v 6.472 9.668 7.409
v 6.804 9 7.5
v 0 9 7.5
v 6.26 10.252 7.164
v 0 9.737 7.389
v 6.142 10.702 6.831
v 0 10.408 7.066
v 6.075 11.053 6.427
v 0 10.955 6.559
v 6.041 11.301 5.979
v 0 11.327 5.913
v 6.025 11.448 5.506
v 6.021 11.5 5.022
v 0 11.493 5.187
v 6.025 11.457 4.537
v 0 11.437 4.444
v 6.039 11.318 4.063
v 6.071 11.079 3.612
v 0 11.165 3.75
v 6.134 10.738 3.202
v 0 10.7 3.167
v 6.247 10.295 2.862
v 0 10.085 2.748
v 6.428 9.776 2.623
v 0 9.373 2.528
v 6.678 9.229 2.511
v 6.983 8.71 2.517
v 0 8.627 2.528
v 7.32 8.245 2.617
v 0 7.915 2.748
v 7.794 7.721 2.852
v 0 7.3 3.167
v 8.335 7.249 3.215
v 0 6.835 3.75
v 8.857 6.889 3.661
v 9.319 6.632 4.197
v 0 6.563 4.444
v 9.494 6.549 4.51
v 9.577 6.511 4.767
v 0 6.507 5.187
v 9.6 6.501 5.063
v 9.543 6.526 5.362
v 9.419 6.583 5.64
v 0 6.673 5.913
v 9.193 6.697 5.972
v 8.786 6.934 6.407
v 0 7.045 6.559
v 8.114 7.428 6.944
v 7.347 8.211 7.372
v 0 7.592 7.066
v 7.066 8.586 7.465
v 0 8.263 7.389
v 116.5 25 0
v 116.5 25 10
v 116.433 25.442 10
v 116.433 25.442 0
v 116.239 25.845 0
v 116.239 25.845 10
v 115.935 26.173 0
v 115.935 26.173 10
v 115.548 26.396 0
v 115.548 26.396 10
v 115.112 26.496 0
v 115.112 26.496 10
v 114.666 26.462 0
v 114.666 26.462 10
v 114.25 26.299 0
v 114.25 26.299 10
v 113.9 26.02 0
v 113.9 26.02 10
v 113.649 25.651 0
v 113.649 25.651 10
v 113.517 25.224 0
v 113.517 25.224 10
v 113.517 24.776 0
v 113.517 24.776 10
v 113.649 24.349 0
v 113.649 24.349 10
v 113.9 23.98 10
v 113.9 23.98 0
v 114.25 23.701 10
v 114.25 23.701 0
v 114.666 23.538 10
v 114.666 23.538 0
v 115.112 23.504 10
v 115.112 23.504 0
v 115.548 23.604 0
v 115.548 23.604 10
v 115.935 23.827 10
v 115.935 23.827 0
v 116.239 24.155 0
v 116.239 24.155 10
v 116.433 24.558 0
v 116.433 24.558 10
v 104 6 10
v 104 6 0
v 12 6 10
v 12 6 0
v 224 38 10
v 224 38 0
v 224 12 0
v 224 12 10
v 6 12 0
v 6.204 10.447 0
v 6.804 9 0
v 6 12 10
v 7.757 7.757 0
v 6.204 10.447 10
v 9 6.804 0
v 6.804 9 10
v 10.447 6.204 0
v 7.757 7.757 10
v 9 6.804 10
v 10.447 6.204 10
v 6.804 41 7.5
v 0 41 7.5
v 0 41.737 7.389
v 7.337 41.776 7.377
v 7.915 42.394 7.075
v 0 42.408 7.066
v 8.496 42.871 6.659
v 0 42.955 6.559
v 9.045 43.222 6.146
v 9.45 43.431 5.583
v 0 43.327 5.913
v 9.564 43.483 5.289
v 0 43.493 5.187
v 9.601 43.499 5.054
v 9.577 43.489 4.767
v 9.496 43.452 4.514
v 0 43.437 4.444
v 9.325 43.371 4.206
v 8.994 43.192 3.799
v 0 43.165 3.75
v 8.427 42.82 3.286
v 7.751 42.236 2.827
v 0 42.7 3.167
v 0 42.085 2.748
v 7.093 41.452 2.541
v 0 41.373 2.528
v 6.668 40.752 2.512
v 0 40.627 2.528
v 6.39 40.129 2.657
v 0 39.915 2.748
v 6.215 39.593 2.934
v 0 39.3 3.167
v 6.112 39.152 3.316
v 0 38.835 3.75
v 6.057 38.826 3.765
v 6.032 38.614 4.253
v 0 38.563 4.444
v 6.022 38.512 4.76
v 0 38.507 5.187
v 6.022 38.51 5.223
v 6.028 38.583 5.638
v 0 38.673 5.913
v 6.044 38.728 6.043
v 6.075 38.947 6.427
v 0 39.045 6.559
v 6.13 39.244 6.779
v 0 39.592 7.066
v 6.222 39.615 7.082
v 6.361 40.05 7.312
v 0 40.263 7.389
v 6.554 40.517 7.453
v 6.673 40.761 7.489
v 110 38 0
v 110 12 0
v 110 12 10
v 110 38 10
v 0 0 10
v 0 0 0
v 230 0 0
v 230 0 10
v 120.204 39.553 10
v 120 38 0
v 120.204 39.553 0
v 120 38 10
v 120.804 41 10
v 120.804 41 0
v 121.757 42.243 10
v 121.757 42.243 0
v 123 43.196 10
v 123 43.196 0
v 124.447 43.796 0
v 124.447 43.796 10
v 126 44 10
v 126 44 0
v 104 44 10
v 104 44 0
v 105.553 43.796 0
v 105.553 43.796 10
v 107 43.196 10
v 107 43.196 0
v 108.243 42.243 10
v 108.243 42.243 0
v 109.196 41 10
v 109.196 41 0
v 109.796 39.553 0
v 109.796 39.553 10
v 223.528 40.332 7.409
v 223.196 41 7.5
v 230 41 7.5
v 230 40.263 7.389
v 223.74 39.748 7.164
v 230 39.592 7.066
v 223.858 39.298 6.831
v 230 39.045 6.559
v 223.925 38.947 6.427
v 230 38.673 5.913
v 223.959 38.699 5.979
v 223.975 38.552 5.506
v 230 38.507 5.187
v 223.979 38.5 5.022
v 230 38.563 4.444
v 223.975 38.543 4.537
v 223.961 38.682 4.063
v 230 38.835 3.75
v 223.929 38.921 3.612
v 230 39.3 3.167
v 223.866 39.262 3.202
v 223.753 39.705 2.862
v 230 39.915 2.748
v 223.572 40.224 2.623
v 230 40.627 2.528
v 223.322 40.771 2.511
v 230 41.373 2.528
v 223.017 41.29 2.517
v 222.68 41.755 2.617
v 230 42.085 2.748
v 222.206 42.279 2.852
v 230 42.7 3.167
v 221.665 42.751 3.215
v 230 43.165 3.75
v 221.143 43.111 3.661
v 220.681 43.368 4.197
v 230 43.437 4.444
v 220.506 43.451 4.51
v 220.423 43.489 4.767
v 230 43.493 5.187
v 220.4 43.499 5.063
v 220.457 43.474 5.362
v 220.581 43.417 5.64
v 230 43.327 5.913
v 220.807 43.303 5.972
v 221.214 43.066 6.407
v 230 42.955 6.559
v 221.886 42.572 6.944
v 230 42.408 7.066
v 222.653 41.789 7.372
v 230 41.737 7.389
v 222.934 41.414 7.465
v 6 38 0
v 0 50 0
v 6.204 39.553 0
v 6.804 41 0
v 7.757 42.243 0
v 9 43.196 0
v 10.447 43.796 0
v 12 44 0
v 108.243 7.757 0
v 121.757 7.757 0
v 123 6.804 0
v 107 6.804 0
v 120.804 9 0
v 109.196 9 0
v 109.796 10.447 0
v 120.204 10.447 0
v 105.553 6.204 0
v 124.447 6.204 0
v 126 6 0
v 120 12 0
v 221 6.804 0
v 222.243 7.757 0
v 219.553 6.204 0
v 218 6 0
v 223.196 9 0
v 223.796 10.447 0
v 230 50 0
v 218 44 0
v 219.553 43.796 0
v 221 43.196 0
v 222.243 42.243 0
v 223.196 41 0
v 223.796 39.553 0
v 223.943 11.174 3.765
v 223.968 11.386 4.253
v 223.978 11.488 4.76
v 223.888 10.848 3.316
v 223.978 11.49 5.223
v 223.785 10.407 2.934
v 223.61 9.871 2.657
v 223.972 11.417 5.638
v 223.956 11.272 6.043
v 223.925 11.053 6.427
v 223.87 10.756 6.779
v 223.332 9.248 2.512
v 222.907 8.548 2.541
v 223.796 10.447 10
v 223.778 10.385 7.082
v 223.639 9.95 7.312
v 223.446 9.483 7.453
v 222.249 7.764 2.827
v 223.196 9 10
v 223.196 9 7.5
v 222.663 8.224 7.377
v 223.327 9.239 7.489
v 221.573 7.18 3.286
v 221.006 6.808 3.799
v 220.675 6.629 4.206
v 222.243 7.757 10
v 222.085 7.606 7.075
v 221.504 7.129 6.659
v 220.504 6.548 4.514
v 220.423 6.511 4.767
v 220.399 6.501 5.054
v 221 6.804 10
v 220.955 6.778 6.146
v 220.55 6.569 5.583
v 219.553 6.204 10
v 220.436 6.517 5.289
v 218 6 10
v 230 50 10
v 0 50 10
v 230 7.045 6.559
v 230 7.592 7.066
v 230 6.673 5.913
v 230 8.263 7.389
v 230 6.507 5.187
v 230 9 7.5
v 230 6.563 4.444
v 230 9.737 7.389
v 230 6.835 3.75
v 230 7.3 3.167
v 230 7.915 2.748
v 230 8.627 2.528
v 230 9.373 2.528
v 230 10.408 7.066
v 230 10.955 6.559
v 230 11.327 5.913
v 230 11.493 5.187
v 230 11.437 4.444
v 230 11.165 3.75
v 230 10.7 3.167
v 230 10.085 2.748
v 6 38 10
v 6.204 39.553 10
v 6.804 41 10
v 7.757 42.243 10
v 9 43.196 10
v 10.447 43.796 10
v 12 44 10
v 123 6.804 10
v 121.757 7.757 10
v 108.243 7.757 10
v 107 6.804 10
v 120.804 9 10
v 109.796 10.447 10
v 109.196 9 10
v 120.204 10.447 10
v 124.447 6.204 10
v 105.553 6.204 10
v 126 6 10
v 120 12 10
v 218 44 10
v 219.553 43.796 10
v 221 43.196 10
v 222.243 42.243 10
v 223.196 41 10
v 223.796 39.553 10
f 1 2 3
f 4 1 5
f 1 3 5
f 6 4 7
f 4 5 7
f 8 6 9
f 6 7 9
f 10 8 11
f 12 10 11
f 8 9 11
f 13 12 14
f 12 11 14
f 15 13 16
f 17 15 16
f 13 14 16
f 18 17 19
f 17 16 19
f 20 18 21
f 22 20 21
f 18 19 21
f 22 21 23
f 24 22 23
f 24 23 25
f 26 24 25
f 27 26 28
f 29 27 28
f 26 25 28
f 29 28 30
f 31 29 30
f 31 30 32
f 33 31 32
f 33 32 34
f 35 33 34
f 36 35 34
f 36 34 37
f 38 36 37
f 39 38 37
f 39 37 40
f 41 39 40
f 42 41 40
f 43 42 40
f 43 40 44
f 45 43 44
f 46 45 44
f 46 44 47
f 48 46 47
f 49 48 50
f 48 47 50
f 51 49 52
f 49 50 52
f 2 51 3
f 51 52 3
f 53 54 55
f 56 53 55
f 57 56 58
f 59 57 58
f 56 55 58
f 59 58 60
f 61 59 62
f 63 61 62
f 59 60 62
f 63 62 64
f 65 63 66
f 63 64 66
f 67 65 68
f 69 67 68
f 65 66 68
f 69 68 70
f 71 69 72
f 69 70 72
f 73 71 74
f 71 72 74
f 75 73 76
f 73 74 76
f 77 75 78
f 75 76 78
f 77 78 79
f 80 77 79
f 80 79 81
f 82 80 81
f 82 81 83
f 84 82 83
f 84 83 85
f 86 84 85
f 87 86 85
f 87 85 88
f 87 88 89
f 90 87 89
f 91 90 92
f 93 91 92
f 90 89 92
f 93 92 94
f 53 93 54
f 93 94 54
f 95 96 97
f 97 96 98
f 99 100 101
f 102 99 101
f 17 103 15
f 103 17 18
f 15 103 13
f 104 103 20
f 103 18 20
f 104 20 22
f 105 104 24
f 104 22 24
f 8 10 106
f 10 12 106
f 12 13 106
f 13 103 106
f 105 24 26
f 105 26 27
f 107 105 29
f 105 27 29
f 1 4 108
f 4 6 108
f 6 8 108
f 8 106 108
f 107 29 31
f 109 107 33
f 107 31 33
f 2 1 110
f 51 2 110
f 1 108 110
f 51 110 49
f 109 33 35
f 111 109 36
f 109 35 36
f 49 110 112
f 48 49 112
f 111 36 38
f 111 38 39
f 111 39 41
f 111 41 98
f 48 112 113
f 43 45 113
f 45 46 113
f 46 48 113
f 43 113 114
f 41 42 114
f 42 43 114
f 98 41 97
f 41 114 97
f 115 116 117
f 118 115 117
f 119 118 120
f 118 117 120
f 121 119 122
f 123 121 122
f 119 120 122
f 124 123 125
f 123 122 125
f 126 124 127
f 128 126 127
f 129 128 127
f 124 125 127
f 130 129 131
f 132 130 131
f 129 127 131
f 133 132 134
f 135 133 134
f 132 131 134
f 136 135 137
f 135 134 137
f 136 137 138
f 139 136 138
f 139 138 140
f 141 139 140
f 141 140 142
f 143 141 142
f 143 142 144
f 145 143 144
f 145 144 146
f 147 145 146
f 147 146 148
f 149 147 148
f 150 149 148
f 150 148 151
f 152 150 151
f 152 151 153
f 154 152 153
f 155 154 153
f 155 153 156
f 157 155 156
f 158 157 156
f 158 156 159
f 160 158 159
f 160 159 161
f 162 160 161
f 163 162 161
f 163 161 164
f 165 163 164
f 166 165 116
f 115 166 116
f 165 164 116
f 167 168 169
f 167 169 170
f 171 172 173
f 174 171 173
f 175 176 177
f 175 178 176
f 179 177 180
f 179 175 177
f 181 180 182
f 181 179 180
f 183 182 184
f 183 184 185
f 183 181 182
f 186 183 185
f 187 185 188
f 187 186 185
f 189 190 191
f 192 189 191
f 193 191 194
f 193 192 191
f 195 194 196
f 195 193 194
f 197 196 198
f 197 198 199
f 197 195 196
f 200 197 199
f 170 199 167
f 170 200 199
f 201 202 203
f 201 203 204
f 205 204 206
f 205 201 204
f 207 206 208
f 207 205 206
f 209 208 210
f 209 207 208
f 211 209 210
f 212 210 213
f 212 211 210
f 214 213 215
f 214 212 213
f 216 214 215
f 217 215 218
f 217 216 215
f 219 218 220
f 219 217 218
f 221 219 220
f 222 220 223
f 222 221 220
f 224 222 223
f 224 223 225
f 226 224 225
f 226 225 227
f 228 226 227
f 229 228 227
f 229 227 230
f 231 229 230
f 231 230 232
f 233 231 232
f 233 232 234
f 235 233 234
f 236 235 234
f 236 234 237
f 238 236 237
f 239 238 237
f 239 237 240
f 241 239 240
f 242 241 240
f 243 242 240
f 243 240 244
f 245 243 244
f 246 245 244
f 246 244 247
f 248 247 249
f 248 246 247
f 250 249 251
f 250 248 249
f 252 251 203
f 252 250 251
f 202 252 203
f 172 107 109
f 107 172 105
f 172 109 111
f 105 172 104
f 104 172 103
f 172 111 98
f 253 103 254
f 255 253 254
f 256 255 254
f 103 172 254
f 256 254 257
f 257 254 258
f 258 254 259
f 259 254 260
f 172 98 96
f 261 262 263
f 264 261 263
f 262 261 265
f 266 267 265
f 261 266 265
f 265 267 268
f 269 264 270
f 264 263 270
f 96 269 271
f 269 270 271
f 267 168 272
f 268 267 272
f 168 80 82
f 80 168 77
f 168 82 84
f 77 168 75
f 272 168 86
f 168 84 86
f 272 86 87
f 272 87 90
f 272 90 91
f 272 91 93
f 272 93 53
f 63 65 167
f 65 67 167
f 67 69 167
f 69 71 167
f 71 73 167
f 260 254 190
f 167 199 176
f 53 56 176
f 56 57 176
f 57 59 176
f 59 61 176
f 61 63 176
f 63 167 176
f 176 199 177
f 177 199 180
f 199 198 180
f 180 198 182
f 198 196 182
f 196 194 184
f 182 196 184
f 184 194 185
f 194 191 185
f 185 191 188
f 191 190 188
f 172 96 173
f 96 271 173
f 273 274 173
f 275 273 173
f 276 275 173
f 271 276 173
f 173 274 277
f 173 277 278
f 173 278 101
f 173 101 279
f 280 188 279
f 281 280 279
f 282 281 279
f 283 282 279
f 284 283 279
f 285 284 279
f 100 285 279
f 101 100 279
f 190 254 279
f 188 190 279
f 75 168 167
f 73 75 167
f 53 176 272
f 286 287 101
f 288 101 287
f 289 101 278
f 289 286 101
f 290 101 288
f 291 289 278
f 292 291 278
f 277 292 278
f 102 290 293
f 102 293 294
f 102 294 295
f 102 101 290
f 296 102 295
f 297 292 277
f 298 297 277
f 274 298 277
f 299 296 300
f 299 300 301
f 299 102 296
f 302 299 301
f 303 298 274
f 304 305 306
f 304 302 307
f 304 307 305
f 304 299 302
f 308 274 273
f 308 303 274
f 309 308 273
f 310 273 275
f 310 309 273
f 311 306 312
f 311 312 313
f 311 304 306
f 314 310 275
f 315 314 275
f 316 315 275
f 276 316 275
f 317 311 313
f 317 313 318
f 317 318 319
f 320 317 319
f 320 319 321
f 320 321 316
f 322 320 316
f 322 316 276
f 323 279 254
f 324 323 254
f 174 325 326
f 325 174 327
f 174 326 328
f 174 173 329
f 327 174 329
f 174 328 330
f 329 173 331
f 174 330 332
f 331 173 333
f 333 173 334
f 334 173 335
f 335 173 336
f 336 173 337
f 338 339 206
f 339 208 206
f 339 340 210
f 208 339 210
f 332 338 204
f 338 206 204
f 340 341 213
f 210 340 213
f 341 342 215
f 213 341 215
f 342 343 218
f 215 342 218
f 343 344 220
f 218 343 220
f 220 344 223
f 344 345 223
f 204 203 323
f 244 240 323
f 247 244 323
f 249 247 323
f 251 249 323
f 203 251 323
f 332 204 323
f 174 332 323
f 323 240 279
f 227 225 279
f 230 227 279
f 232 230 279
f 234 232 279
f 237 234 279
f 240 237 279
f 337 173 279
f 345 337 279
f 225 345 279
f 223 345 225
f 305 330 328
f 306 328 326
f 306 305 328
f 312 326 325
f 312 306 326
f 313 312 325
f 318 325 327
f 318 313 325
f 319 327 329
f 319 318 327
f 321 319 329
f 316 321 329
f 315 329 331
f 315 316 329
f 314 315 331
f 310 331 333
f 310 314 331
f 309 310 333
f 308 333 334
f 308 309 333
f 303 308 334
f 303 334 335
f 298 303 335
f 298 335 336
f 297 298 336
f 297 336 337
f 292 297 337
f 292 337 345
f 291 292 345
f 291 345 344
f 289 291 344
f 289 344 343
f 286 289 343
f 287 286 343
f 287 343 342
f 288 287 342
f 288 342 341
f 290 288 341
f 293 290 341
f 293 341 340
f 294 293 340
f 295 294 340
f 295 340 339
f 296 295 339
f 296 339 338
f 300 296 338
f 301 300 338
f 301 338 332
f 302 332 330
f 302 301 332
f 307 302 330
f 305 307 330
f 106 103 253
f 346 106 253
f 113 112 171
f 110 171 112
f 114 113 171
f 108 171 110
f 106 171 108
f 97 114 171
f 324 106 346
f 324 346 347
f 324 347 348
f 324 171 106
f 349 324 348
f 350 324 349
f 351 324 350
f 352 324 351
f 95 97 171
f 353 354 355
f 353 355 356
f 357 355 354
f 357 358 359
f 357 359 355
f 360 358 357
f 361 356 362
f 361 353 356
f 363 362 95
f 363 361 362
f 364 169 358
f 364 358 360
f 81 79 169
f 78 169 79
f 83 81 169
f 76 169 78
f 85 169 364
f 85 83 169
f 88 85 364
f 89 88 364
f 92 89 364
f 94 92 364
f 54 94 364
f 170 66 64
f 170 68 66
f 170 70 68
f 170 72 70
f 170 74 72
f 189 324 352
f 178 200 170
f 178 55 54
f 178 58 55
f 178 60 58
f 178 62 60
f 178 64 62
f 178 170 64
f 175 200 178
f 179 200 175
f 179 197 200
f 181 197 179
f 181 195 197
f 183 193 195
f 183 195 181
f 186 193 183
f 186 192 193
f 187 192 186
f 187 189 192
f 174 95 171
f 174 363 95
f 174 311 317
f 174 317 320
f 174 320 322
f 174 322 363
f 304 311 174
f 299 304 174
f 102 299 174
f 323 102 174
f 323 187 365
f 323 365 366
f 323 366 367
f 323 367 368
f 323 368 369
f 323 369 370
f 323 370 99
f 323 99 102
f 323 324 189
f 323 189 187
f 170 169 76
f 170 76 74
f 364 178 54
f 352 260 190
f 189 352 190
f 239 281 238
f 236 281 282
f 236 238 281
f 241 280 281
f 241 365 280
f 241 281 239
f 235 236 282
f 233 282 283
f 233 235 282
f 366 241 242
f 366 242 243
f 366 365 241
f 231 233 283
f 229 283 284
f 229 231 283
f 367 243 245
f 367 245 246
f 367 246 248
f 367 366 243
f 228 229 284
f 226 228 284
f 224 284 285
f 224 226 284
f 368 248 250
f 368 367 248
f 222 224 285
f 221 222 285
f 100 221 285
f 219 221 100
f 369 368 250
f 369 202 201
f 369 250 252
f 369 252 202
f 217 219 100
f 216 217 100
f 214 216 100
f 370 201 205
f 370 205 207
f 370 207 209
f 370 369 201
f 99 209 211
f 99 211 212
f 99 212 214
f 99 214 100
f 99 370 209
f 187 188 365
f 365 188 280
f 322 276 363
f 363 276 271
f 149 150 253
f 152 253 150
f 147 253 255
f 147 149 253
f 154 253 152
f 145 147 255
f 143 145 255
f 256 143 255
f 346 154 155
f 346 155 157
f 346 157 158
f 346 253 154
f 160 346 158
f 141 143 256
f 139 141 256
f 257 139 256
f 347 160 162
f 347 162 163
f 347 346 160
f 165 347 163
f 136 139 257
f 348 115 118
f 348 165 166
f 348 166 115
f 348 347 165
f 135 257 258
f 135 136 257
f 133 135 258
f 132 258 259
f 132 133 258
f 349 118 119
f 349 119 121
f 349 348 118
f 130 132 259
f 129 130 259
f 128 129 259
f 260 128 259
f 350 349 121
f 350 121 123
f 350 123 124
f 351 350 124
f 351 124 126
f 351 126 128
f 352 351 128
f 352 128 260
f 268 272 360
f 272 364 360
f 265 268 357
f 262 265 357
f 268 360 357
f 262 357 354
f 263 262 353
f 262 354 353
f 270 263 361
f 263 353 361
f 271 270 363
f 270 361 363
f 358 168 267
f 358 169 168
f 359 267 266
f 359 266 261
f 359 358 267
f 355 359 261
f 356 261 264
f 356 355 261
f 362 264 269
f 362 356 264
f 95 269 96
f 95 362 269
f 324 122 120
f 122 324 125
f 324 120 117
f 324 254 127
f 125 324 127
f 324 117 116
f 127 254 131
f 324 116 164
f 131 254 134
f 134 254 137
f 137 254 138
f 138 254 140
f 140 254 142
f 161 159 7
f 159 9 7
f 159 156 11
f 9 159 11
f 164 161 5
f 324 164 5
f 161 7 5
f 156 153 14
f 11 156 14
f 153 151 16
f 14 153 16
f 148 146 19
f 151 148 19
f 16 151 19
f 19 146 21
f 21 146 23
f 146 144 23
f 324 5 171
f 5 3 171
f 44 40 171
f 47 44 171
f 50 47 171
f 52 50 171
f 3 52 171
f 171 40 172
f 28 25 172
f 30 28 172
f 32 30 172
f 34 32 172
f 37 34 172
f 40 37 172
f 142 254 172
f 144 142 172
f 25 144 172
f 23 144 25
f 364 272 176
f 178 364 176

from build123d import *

# Parameters (mm, degrees)
SKETCH_1_W          = 5
SKETCH_1_H          = 38
EXTRUDE_1_DEPTH     = 10
FILLET_1_R          = 6
SKETCH_8_R          = 2.5
CUT_EXTRUDE_4_DEPTH = 91
CUT_EXTRUDE_START   = -91
SKETCH_10_R         = 2.5
CUT_EXTRUDE_5_DEPTH = 91
SKETCH_15_R         = 1.5
CUT_EXTRUDE_9_DEPTH = 10


with BuildPart() as part:
    # 草图1 → 凸台-拉伸1 (new body)
    with BuildSketch(Plane.XY):
        Polygon((6, 6), (6, 44), (110, 44), (115, 44), (115, 50), (0, 50), (0, 0), (115, 0), (115, 6), (110, 6), align=None)
        with Locations((117.5, 25)):
            Rectangle(SKETCH_1_W, SKETCH_1_H)
        with Locations((112.5, 25)):
            Rectangle(SKETCH_1_W, SKETCH_1_H)
        Polygon((115, 50), (115, 44), (120, 44), (224, 44), (224, 6), (120, 6), (115, 6), (115, 0), (230, 0), (230, 50), align=None)
    extrude(amount=EXTRUDE_1_DEPTH)

    # 圆角1
    fillet_1_edges = [part.edges().sort_by_distance(p)[0] for p in [
        (110, 44, 5),
        (6, 44, 5),
        (6, 6, 5),
        (110, 6, 5),
        (120, 6, 5),
        (224, 6, 5),
        (224, 44, 5),
        (120, 44, 5),
    ]]
    fillet(fillet_1_edges, radius=FILLET_1_R)

    # 草图8 → 切除-拉伸4 (cut)
    with BuildSketch(Plane.ZY):
        with Locations((5, 41)):
            Circle(SKETCH_8_R)
        with Locations((5, 9)):
            Circle(SKETCH_8_R)
    extrude(amount=-CUT_EXTRUDE_4_DEPTH, mode=Mode.SUBTRACT)

    # 草图10 → 切除-拉伸5 (cut)
    with BuildSketch(Plane(origin=(230, 0, 0), x_dir=(0, 0, -1), z_dir=(1, 0, 0)).offset(CUT_EXTRUDE_START)):
        with Locations(Location((-5, 41, 0), (0, 0, 180))):
            Circle(SKETCH_10_R)
        with Locations(Location((-5, 9, 0), (0, 0, 180))):
            Circle(SKETCH_10_R)
    extrude(amount=CUT_EXTRUDE_5_DEPTH, mode=Mode.SUBTRACT)

    # 草图15 → 切除-拉伸9 (cut)
    with BuildSketch(Plane.XY.offset(10)):
        with Locations((115, 25)):
            Circle(SKETCH_15_R)
    extrude(amount=-CUT_EXTRUDE_9_DEPTH, mode=Mode.SUBTRACT)


solid = part.part
